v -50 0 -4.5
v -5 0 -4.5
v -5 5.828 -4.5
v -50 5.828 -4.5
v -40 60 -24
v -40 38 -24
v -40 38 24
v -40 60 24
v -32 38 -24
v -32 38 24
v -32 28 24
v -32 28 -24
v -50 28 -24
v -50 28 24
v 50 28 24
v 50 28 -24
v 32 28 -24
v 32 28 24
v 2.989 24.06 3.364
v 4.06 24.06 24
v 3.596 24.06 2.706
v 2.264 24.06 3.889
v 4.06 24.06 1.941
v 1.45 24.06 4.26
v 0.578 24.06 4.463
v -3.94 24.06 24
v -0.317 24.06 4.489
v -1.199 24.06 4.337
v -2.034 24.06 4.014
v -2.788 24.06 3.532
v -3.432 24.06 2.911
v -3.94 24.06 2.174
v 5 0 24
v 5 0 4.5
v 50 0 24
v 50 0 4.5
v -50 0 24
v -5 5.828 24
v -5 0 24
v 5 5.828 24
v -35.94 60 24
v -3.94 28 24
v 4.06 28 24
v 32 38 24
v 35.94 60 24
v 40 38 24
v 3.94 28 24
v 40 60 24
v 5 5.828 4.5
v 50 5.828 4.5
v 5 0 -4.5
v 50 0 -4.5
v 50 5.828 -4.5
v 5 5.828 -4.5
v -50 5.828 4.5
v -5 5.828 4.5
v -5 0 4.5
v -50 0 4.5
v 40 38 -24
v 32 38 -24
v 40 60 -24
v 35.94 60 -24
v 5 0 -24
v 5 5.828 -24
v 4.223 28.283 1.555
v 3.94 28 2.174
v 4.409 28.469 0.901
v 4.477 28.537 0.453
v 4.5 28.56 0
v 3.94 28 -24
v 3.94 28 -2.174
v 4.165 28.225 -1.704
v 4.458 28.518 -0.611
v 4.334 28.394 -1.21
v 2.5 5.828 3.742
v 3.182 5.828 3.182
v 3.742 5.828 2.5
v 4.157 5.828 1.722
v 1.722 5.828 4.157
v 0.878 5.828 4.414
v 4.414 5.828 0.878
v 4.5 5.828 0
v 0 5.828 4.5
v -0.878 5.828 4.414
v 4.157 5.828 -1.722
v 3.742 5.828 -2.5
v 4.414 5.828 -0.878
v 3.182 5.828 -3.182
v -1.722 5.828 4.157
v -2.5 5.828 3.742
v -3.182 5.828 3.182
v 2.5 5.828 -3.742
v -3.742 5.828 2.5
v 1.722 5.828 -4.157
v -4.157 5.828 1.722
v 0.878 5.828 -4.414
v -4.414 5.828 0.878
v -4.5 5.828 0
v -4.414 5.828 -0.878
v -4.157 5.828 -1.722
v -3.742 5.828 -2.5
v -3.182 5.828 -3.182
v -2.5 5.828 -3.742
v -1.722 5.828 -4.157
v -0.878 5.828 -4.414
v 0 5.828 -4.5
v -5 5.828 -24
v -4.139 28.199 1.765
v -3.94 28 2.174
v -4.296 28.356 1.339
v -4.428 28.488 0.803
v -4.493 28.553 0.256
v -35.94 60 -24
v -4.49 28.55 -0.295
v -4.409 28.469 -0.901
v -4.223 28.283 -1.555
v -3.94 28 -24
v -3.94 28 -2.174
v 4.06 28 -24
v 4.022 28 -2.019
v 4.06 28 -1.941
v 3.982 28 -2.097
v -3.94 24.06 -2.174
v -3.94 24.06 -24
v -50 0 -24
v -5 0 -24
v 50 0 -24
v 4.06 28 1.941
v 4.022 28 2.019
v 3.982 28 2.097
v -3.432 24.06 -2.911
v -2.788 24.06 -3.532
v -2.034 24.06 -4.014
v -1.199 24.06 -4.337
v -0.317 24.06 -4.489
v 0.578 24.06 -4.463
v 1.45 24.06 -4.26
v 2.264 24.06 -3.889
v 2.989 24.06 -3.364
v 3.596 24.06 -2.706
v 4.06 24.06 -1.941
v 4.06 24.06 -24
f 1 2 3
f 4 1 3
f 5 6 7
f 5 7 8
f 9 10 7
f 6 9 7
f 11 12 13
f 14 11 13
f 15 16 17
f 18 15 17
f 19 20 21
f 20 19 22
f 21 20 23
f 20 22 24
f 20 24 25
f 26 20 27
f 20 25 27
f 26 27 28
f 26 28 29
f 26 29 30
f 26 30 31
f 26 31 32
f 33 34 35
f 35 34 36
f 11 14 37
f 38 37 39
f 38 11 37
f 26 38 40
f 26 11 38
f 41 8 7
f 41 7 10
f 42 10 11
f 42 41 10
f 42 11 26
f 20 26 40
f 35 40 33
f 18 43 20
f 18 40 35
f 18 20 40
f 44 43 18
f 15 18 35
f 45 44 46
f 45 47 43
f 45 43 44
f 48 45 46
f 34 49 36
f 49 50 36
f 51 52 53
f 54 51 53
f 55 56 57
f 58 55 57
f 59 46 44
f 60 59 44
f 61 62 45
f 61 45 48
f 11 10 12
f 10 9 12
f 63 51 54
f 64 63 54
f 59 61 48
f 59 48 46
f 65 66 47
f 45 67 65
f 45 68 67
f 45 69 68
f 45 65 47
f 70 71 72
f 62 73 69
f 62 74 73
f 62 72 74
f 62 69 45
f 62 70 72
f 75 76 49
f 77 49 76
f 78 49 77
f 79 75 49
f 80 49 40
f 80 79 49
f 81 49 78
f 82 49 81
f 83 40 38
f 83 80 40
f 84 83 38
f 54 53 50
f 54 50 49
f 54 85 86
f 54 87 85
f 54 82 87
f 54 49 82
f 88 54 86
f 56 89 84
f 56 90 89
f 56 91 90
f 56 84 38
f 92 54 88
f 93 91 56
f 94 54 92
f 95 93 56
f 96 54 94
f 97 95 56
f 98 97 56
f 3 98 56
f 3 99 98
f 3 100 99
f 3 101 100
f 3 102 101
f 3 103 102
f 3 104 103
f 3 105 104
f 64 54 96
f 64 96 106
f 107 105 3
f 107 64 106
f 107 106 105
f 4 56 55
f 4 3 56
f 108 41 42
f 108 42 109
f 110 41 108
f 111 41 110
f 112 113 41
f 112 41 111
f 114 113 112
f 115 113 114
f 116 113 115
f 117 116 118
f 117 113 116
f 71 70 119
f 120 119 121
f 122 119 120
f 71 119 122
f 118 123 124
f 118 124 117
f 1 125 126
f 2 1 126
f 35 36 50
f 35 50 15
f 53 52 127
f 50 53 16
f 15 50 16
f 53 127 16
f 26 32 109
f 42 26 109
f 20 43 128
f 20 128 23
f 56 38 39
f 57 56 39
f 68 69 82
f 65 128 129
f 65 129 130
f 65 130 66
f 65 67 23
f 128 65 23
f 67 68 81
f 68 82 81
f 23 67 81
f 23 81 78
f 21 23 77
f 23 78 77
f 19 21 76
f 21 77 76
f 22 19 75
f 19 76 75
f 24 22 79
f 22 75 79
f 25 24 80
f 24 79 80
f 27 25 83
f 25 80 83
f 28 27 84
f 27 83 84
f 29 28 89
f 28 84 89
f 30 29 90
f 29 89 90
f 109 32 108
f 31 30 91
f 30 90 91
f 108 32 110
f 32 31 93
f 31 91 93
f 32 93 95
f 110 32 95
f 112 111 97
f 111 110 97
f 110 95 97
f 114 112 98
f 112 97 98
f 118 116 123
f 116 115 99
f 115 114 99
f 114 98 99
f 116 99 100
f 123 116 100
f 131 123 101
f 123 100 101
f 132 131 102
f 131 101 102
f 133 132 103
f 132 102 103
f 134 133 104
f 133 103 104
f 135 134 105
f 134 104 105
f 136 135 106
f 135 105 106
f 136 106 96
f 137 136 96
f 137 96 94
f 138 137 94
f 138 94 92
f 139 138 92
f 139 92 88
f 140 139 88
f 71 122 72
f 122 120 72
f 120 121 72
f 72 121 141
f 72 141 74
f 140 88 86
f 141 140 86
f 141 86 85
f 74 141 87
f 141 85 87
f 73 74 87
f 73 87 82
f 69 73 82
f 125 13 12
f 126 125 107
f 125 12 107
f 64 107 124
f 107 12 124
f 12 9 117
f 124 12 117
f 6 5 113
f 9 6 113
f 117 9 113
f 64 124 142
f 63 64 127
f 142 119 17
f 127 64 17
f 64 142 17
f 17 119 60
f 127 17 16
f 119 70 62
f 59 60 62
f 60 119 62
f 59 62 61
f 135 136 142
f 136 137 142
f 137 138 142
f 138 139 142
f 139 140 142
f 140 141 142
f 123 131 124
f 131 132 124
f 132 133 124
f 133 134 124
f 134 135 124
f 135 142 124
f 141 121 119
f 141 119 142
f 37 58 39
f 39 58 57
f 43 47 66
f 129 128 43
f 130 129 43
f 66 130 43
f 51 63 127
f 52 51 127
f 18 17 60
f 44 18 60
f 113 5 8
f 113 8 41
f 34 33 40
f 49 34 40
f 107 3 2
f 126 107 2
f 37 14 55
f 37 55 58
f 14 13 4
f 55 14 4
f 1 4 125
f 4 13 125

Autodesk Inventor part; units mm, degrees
ref_plane "YZ Plane" through (0, 0, 0) normal (1, 0, 0) x (0, 1, 0)
ref_plane "XZ Plane" through (0, 0, 0) normal (0, 1, 0) x (-1, 0, 0)
ref_plane "XY Plane" through (0, 0, 0) normal (0, 0, 1) x (1, 0, 0)
sketch "스케치1" plane through (0, 0, 0) normal (0, 0, 1) x (1, 0, 0)
  line L0 (50, 0) -> (50, 28)
  line L1 (-50, 28) -> (-50, 0)
  line L2 (32, 28) -> (32, 38)
  line L3 (-32, 38) -> (-32, 28)
  line L4 (-40, 38) -> (-40, 60)
  line L5 (40, 60) -> (40, 38)
  line L6 (-35.94, 60) -> (-3.94, 28)
  line L7 (3.94, 28) -> (35.94, 60)
  line L8 (-40, 60) -> (-35.94, 60)
  line L9 (35.94, 60) -> (40, 60)
  line L10 (3.94, 28) -> (4.06, 28)
  line L11 (4.06, 28) -> (4.06, 24.06)
  line L12 (4.06, 24.06) -> (-3.94, 24.06)
  line L13 (-3.94, 24.06) -> (-3.94, 28)
  line L14 (-32, 28) -> (-3.94, 28)
  line L15 (3.94, 28) -> (32, 28)
  line L16 (50, 28) -> (3.94, 28)
  line L17 (-3.94, 28) -> (-50, 28)
  line L18 (32, 38) -> (13.94, 38)
  line L19 (-13.94, 38) -> (-32, 38)
  line L20 (40, 38) -> (13.94, 38)
  line L21 (-13.94, 38) -> (-40, 38)
  line L22 (4.06, 0) -> (5, 0)
  line L23 (5, 0) -> (5, 5.8283)
  line L24 (5, 5.8283) -> (-5, 5.8283)
  line L25 (-5, 5.8283) -> (-5, 0)
  line L26 (-50, 0) -> (-5, 0)
  line L27 (5, 0) -> (50, 0)
  point P0 (0, 0)
  point P1 (0, 0)
  dimension "d0" = 100
  dimension "d1" = 28
  dimension "d2" = 50
  dimension "d3" = 64
  dimension "d4" = 32
  dimension "d5" = 10
  dimension "d6" = 80
  dimension "d8" = 40
  dimension "d11" = 90
  dimension "d12" = 80
  dimension "d13" = 4.06
  dimension "d14" = 4.06
  dimension "d15" = 8
  dimension "d16" = 10
  dimension "d17" = 5
extrude "돌출1" add sketch "스케치1" along normal mid plane 48
sketch "스케치2" plane through (50, 0, 24) normal (1, 0, 0) x (0, 0, -1)
  line L0 (48, 0) -> (0, 0) projected
  line L1 (48, 5.8283) -> (0, 5.8283) projected
  line L2 (19.5, 0) -> (28.5, 0)
  line L3 (28.5, 0) -> (28.5, 5.8283)
  line L4 (28.5, 5.8283) -> (19.5, 5.8283)
  line L5 (19.5, 5.8283) -> (19.5, 0)
  point P0 (24, 0)
  dimension "d20" = 9
  dimension "d21" = 4.5
extrude "돌출2" cut sketch "스케치2" against normal through all
sketch "스케치3" plane through (-5, 5.8283, 24) normal (0, -1, 0) x (1, 0, 0)
  circle A0 centre (5, -24) radius 4.5
  dimension "d24" = 9
extrude "돌출3" cut sketch "스케치3" against normal through all
properties part number "부품1"
